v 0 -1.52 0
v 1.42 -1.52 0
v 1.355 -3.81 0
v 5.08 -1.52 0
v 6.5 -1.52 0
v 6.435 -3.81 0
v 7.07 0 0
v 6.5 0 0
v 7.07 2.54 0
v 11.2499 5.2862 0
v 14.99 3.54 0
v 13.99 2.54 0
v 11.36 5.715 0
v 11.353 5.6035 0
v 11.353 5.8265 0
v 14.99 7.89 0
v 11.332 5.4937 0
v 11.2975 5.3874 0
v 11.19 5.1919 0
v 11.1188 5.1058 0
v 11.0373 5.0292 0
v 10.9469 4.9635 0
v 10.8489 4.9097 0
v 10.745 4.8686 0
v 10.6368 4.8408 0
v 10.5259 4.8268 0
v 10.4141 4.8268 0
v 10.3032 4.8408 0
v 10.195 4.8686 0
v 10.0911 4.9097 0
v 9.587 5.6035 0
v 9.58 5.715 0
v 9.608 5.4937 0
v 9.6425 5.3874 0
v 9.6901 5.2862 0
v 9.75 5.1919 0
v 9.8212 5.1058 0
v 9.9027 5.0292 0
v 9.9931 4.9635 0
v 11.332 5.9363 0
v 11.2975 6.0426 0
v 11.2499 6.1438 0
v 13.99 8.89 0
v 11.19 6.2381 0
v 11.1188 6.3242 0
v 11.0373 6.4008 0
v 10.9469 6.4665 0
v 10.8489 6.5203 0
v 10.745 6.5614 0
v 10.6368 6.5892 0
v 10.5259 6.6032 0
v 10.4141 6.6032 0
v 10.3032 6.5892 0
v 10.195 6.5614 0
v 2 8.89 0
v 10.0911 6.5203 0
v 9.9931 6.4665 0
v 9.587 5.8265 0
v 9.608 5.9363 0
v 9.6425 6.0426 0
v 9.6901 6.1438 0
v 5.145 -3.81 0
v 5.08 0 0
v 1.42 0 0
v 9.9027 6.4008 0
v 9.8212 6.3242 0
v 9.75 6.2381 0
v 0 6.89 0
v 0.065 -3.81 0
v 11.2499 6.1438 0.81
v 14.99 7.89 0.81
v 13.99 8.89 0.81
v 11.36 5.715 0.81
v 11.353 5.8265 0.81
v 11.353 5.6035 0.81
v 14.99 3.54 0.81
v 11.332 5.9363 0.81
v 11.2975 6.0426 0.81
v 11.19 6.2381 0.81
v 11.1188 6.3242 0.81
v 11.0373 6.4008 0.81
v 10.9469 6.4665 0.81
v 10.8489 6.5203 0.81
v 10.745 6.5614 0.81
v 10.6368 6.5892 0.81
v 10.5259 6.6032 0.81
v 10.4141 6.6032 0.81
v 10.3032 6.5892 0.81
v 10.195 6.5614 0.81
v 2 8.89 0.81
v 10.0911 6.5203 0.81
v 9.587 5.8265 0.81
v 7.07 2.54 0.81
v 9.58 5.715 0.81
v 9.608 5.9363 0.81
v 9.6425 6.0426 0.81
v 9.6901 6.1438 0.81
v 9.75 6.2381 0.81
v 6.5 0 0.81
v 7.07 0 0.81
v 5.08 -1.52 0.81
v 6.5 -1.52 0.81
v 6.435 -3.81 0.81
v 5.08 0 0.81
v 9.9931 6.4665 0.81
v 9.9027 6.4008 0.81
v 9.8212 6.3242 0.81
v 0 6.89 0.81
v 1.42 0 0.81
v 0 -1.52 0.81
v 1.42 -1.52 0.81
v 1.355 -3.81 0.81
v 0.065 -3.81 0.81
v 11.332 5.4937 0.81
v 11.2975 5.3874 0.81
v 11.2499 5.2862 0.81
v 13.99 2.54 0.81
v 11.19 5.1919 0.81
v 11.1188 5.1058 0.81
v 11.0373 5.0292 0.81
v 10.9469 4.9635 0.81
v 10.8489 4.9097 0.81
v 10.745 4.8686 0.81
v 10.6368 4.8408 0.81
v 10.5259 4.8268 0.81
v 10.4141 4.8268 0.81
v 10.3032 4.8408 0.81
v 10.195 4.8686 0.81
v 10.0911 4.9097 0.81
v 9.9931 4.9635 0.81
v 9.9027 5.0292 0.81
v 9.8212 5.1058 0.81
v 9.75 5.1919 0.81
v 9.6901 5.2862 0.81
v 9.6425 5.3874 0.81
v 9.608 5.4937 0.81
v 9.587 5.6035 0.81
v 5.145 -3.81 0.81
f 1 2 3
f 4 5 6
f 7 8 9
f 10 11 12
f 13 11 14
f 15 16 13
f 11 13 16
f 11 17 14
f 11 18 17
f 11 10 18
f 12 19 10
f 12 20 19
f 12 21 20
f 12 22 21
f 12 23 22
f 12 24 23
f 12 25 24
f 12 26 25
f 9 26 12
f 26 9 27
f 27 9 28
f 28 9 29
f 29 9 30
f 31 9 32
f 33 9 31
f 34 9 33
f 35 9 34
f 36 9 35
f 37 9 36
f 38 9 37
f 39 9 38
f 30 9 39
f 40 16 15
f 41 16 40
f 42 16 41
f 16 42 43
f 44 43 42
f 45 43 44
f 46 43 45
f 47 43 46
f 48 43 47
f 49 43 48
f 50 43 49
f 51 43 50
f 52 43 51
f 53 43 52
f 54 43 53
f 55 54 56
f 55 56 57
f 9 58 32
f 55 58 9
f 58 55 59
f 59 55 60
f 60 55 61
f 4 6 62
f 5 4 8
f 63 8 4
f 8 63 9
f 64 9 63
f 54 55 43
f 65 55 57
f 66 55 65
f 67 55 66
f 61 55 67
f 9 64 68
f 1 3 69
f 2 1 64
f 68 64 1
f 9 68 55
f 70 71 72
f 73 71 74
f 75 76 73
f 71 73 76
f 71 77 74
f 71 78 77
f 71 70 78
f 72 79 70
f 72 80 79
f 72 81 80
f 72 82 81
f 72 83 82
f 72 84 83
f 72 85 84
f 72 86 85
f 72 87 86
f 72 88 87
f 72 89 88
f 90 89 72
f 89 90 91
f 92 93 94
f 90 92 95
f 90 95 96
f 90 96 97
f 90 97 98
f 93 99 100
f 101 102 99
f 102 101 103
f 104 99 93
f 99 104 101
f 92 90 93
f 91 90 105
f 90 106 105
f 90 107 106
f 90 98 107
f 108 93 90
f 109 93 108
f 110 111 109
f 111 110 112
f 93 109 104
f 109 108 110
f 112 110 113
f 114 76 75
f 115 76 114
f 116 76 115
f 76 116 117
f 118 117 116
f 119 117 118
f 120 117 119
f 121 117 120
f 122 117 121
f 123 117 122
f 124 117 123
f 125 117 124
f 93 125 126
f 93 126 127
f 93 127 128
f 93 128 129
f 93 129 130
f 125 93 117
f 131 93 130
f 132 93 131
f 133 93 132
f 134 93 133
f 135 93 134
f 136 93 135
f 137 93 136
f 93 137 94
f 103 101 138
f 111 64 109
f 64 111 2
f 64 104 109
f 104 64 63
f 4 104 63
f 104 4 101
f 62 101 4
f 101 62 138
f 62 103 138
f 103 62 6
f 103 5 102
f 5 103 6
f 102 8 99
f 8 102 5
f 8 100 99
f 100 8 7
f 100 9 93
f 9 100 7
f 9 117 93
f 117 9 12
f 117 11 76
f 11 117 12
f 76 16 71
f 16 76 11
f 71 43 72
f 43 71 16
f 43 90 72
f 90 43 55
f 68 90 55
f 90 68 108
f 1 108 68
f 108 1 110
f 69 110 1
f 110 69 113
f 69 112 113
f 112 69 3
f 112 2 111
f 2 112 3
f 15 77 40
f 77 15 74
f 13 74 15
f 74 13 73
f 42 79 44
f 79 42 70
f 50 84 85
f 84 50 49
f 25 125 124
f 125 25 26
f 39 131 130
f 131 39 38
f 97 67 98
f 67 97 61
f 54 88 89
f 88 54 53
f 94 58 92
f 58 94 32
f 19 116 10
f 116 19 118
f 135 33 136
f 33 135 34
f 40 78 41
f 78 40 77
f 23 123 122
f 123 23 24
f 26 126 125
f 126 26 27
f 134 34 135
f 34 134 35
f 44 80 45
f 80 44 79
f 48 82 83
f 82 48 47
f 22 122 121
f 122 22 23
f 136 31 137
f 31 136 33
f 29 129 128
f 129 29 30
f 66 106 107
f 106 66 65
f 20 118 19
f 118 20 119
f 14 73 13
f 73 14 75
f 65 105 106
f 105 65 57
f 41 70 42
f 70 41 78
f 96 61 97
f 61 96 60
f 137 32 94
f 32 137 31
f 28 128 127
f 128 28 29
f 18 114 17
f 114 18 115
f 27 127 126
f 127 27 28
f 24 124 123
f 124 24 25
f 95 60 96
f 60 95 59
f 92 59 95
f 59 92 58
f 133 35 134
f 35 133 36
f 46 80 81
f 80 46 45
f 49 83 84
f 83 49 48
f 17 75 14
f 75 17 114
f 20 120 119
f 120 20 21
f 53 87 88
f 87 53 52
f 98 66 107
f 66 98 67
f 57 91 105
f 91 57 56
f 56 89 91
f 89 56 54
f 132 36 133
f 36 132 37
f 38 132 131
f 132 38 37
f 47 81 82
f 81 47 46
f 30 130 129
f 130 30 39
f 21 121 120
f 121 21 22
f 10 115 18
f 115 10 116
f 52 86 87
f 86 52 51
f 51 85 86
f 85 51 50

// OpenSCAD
// Keystone 4966 Right Angle Spade Terminal model
//
// Based on https://www.mouser.com/datasheet/2/215/4966-743260.pdf

thickness = 0.81;

full_width = 14.99;
from_pcb_height = 8.89;

rear_chamfer_size = 2;
front_chamfer_size = 1;

spade_width = 7.92;
spade_height = 6.35;

pin_height = 3.81;
pin_height_straight = 1.52;
pin_width_top = 1.42;
pin_width_bottom = 1.29;
pin_spacing = 5.08;

hole_dia = 1.78;
hole_offset = 4.52;

overcut = 0.1;

module mainBody() {
    linear_extrude(height = thickness) {
        polygon(points=[
        
            // terminal body
            [0, 0],
            [0, from_pcb_height-rear_chamfer_size],
            [rear_chamfer_size, from_pcb_height],
            [full_width-front_chamfer_size, from_pcb_height],
            [full_width, from_pcb_height-front_chamfer_size],
            [full_width, from_pcb_height-spade_height+front_chamfer_size],
            [full_width-front_chamfer_size, from_pcb_height-spade_height],
            [full_width-spade_width, from_pcb_height-spade_height],
            [full_width-spade_width, 0],
        
            // forward pin
            [pin_spacing+pin_width_top, 0],
            [pin_spacing+pin_width_top, -pin_height_straight],
            [pin_spacing+pin_width_top-0.5*(pin_width_top-pin_width_bottom), -pin_height],
            [pin_spacing+0.5*(pin_width_top-pin_width_bottom), -pin_height],
            [pin_spacing, -pin_height_straight],
            [pin_spacing, 0],
        
            // rear pin
            [pin_width_top, 0],
            [pin_width_top, -pin_height_straight],
            [pin_width_top-0.5*(pin_width_top-pin_width_bottom), -pin_height],
            [0.5*(pin_width_top-pin_width_bottom), -pin_height],
            [0, -pin_height_straight],
        ]);
    }
}

module hole() {
    translate([full_width-hole_offset, from_pcb_height-0.5*spade_height, -overcut])
        cylinder(d=hole_dia, h=thickness+2*overcut, $fn=50);
}

module terminal() {
    difference() {
        mainBody();
        hole();
    }
}

terminal();
